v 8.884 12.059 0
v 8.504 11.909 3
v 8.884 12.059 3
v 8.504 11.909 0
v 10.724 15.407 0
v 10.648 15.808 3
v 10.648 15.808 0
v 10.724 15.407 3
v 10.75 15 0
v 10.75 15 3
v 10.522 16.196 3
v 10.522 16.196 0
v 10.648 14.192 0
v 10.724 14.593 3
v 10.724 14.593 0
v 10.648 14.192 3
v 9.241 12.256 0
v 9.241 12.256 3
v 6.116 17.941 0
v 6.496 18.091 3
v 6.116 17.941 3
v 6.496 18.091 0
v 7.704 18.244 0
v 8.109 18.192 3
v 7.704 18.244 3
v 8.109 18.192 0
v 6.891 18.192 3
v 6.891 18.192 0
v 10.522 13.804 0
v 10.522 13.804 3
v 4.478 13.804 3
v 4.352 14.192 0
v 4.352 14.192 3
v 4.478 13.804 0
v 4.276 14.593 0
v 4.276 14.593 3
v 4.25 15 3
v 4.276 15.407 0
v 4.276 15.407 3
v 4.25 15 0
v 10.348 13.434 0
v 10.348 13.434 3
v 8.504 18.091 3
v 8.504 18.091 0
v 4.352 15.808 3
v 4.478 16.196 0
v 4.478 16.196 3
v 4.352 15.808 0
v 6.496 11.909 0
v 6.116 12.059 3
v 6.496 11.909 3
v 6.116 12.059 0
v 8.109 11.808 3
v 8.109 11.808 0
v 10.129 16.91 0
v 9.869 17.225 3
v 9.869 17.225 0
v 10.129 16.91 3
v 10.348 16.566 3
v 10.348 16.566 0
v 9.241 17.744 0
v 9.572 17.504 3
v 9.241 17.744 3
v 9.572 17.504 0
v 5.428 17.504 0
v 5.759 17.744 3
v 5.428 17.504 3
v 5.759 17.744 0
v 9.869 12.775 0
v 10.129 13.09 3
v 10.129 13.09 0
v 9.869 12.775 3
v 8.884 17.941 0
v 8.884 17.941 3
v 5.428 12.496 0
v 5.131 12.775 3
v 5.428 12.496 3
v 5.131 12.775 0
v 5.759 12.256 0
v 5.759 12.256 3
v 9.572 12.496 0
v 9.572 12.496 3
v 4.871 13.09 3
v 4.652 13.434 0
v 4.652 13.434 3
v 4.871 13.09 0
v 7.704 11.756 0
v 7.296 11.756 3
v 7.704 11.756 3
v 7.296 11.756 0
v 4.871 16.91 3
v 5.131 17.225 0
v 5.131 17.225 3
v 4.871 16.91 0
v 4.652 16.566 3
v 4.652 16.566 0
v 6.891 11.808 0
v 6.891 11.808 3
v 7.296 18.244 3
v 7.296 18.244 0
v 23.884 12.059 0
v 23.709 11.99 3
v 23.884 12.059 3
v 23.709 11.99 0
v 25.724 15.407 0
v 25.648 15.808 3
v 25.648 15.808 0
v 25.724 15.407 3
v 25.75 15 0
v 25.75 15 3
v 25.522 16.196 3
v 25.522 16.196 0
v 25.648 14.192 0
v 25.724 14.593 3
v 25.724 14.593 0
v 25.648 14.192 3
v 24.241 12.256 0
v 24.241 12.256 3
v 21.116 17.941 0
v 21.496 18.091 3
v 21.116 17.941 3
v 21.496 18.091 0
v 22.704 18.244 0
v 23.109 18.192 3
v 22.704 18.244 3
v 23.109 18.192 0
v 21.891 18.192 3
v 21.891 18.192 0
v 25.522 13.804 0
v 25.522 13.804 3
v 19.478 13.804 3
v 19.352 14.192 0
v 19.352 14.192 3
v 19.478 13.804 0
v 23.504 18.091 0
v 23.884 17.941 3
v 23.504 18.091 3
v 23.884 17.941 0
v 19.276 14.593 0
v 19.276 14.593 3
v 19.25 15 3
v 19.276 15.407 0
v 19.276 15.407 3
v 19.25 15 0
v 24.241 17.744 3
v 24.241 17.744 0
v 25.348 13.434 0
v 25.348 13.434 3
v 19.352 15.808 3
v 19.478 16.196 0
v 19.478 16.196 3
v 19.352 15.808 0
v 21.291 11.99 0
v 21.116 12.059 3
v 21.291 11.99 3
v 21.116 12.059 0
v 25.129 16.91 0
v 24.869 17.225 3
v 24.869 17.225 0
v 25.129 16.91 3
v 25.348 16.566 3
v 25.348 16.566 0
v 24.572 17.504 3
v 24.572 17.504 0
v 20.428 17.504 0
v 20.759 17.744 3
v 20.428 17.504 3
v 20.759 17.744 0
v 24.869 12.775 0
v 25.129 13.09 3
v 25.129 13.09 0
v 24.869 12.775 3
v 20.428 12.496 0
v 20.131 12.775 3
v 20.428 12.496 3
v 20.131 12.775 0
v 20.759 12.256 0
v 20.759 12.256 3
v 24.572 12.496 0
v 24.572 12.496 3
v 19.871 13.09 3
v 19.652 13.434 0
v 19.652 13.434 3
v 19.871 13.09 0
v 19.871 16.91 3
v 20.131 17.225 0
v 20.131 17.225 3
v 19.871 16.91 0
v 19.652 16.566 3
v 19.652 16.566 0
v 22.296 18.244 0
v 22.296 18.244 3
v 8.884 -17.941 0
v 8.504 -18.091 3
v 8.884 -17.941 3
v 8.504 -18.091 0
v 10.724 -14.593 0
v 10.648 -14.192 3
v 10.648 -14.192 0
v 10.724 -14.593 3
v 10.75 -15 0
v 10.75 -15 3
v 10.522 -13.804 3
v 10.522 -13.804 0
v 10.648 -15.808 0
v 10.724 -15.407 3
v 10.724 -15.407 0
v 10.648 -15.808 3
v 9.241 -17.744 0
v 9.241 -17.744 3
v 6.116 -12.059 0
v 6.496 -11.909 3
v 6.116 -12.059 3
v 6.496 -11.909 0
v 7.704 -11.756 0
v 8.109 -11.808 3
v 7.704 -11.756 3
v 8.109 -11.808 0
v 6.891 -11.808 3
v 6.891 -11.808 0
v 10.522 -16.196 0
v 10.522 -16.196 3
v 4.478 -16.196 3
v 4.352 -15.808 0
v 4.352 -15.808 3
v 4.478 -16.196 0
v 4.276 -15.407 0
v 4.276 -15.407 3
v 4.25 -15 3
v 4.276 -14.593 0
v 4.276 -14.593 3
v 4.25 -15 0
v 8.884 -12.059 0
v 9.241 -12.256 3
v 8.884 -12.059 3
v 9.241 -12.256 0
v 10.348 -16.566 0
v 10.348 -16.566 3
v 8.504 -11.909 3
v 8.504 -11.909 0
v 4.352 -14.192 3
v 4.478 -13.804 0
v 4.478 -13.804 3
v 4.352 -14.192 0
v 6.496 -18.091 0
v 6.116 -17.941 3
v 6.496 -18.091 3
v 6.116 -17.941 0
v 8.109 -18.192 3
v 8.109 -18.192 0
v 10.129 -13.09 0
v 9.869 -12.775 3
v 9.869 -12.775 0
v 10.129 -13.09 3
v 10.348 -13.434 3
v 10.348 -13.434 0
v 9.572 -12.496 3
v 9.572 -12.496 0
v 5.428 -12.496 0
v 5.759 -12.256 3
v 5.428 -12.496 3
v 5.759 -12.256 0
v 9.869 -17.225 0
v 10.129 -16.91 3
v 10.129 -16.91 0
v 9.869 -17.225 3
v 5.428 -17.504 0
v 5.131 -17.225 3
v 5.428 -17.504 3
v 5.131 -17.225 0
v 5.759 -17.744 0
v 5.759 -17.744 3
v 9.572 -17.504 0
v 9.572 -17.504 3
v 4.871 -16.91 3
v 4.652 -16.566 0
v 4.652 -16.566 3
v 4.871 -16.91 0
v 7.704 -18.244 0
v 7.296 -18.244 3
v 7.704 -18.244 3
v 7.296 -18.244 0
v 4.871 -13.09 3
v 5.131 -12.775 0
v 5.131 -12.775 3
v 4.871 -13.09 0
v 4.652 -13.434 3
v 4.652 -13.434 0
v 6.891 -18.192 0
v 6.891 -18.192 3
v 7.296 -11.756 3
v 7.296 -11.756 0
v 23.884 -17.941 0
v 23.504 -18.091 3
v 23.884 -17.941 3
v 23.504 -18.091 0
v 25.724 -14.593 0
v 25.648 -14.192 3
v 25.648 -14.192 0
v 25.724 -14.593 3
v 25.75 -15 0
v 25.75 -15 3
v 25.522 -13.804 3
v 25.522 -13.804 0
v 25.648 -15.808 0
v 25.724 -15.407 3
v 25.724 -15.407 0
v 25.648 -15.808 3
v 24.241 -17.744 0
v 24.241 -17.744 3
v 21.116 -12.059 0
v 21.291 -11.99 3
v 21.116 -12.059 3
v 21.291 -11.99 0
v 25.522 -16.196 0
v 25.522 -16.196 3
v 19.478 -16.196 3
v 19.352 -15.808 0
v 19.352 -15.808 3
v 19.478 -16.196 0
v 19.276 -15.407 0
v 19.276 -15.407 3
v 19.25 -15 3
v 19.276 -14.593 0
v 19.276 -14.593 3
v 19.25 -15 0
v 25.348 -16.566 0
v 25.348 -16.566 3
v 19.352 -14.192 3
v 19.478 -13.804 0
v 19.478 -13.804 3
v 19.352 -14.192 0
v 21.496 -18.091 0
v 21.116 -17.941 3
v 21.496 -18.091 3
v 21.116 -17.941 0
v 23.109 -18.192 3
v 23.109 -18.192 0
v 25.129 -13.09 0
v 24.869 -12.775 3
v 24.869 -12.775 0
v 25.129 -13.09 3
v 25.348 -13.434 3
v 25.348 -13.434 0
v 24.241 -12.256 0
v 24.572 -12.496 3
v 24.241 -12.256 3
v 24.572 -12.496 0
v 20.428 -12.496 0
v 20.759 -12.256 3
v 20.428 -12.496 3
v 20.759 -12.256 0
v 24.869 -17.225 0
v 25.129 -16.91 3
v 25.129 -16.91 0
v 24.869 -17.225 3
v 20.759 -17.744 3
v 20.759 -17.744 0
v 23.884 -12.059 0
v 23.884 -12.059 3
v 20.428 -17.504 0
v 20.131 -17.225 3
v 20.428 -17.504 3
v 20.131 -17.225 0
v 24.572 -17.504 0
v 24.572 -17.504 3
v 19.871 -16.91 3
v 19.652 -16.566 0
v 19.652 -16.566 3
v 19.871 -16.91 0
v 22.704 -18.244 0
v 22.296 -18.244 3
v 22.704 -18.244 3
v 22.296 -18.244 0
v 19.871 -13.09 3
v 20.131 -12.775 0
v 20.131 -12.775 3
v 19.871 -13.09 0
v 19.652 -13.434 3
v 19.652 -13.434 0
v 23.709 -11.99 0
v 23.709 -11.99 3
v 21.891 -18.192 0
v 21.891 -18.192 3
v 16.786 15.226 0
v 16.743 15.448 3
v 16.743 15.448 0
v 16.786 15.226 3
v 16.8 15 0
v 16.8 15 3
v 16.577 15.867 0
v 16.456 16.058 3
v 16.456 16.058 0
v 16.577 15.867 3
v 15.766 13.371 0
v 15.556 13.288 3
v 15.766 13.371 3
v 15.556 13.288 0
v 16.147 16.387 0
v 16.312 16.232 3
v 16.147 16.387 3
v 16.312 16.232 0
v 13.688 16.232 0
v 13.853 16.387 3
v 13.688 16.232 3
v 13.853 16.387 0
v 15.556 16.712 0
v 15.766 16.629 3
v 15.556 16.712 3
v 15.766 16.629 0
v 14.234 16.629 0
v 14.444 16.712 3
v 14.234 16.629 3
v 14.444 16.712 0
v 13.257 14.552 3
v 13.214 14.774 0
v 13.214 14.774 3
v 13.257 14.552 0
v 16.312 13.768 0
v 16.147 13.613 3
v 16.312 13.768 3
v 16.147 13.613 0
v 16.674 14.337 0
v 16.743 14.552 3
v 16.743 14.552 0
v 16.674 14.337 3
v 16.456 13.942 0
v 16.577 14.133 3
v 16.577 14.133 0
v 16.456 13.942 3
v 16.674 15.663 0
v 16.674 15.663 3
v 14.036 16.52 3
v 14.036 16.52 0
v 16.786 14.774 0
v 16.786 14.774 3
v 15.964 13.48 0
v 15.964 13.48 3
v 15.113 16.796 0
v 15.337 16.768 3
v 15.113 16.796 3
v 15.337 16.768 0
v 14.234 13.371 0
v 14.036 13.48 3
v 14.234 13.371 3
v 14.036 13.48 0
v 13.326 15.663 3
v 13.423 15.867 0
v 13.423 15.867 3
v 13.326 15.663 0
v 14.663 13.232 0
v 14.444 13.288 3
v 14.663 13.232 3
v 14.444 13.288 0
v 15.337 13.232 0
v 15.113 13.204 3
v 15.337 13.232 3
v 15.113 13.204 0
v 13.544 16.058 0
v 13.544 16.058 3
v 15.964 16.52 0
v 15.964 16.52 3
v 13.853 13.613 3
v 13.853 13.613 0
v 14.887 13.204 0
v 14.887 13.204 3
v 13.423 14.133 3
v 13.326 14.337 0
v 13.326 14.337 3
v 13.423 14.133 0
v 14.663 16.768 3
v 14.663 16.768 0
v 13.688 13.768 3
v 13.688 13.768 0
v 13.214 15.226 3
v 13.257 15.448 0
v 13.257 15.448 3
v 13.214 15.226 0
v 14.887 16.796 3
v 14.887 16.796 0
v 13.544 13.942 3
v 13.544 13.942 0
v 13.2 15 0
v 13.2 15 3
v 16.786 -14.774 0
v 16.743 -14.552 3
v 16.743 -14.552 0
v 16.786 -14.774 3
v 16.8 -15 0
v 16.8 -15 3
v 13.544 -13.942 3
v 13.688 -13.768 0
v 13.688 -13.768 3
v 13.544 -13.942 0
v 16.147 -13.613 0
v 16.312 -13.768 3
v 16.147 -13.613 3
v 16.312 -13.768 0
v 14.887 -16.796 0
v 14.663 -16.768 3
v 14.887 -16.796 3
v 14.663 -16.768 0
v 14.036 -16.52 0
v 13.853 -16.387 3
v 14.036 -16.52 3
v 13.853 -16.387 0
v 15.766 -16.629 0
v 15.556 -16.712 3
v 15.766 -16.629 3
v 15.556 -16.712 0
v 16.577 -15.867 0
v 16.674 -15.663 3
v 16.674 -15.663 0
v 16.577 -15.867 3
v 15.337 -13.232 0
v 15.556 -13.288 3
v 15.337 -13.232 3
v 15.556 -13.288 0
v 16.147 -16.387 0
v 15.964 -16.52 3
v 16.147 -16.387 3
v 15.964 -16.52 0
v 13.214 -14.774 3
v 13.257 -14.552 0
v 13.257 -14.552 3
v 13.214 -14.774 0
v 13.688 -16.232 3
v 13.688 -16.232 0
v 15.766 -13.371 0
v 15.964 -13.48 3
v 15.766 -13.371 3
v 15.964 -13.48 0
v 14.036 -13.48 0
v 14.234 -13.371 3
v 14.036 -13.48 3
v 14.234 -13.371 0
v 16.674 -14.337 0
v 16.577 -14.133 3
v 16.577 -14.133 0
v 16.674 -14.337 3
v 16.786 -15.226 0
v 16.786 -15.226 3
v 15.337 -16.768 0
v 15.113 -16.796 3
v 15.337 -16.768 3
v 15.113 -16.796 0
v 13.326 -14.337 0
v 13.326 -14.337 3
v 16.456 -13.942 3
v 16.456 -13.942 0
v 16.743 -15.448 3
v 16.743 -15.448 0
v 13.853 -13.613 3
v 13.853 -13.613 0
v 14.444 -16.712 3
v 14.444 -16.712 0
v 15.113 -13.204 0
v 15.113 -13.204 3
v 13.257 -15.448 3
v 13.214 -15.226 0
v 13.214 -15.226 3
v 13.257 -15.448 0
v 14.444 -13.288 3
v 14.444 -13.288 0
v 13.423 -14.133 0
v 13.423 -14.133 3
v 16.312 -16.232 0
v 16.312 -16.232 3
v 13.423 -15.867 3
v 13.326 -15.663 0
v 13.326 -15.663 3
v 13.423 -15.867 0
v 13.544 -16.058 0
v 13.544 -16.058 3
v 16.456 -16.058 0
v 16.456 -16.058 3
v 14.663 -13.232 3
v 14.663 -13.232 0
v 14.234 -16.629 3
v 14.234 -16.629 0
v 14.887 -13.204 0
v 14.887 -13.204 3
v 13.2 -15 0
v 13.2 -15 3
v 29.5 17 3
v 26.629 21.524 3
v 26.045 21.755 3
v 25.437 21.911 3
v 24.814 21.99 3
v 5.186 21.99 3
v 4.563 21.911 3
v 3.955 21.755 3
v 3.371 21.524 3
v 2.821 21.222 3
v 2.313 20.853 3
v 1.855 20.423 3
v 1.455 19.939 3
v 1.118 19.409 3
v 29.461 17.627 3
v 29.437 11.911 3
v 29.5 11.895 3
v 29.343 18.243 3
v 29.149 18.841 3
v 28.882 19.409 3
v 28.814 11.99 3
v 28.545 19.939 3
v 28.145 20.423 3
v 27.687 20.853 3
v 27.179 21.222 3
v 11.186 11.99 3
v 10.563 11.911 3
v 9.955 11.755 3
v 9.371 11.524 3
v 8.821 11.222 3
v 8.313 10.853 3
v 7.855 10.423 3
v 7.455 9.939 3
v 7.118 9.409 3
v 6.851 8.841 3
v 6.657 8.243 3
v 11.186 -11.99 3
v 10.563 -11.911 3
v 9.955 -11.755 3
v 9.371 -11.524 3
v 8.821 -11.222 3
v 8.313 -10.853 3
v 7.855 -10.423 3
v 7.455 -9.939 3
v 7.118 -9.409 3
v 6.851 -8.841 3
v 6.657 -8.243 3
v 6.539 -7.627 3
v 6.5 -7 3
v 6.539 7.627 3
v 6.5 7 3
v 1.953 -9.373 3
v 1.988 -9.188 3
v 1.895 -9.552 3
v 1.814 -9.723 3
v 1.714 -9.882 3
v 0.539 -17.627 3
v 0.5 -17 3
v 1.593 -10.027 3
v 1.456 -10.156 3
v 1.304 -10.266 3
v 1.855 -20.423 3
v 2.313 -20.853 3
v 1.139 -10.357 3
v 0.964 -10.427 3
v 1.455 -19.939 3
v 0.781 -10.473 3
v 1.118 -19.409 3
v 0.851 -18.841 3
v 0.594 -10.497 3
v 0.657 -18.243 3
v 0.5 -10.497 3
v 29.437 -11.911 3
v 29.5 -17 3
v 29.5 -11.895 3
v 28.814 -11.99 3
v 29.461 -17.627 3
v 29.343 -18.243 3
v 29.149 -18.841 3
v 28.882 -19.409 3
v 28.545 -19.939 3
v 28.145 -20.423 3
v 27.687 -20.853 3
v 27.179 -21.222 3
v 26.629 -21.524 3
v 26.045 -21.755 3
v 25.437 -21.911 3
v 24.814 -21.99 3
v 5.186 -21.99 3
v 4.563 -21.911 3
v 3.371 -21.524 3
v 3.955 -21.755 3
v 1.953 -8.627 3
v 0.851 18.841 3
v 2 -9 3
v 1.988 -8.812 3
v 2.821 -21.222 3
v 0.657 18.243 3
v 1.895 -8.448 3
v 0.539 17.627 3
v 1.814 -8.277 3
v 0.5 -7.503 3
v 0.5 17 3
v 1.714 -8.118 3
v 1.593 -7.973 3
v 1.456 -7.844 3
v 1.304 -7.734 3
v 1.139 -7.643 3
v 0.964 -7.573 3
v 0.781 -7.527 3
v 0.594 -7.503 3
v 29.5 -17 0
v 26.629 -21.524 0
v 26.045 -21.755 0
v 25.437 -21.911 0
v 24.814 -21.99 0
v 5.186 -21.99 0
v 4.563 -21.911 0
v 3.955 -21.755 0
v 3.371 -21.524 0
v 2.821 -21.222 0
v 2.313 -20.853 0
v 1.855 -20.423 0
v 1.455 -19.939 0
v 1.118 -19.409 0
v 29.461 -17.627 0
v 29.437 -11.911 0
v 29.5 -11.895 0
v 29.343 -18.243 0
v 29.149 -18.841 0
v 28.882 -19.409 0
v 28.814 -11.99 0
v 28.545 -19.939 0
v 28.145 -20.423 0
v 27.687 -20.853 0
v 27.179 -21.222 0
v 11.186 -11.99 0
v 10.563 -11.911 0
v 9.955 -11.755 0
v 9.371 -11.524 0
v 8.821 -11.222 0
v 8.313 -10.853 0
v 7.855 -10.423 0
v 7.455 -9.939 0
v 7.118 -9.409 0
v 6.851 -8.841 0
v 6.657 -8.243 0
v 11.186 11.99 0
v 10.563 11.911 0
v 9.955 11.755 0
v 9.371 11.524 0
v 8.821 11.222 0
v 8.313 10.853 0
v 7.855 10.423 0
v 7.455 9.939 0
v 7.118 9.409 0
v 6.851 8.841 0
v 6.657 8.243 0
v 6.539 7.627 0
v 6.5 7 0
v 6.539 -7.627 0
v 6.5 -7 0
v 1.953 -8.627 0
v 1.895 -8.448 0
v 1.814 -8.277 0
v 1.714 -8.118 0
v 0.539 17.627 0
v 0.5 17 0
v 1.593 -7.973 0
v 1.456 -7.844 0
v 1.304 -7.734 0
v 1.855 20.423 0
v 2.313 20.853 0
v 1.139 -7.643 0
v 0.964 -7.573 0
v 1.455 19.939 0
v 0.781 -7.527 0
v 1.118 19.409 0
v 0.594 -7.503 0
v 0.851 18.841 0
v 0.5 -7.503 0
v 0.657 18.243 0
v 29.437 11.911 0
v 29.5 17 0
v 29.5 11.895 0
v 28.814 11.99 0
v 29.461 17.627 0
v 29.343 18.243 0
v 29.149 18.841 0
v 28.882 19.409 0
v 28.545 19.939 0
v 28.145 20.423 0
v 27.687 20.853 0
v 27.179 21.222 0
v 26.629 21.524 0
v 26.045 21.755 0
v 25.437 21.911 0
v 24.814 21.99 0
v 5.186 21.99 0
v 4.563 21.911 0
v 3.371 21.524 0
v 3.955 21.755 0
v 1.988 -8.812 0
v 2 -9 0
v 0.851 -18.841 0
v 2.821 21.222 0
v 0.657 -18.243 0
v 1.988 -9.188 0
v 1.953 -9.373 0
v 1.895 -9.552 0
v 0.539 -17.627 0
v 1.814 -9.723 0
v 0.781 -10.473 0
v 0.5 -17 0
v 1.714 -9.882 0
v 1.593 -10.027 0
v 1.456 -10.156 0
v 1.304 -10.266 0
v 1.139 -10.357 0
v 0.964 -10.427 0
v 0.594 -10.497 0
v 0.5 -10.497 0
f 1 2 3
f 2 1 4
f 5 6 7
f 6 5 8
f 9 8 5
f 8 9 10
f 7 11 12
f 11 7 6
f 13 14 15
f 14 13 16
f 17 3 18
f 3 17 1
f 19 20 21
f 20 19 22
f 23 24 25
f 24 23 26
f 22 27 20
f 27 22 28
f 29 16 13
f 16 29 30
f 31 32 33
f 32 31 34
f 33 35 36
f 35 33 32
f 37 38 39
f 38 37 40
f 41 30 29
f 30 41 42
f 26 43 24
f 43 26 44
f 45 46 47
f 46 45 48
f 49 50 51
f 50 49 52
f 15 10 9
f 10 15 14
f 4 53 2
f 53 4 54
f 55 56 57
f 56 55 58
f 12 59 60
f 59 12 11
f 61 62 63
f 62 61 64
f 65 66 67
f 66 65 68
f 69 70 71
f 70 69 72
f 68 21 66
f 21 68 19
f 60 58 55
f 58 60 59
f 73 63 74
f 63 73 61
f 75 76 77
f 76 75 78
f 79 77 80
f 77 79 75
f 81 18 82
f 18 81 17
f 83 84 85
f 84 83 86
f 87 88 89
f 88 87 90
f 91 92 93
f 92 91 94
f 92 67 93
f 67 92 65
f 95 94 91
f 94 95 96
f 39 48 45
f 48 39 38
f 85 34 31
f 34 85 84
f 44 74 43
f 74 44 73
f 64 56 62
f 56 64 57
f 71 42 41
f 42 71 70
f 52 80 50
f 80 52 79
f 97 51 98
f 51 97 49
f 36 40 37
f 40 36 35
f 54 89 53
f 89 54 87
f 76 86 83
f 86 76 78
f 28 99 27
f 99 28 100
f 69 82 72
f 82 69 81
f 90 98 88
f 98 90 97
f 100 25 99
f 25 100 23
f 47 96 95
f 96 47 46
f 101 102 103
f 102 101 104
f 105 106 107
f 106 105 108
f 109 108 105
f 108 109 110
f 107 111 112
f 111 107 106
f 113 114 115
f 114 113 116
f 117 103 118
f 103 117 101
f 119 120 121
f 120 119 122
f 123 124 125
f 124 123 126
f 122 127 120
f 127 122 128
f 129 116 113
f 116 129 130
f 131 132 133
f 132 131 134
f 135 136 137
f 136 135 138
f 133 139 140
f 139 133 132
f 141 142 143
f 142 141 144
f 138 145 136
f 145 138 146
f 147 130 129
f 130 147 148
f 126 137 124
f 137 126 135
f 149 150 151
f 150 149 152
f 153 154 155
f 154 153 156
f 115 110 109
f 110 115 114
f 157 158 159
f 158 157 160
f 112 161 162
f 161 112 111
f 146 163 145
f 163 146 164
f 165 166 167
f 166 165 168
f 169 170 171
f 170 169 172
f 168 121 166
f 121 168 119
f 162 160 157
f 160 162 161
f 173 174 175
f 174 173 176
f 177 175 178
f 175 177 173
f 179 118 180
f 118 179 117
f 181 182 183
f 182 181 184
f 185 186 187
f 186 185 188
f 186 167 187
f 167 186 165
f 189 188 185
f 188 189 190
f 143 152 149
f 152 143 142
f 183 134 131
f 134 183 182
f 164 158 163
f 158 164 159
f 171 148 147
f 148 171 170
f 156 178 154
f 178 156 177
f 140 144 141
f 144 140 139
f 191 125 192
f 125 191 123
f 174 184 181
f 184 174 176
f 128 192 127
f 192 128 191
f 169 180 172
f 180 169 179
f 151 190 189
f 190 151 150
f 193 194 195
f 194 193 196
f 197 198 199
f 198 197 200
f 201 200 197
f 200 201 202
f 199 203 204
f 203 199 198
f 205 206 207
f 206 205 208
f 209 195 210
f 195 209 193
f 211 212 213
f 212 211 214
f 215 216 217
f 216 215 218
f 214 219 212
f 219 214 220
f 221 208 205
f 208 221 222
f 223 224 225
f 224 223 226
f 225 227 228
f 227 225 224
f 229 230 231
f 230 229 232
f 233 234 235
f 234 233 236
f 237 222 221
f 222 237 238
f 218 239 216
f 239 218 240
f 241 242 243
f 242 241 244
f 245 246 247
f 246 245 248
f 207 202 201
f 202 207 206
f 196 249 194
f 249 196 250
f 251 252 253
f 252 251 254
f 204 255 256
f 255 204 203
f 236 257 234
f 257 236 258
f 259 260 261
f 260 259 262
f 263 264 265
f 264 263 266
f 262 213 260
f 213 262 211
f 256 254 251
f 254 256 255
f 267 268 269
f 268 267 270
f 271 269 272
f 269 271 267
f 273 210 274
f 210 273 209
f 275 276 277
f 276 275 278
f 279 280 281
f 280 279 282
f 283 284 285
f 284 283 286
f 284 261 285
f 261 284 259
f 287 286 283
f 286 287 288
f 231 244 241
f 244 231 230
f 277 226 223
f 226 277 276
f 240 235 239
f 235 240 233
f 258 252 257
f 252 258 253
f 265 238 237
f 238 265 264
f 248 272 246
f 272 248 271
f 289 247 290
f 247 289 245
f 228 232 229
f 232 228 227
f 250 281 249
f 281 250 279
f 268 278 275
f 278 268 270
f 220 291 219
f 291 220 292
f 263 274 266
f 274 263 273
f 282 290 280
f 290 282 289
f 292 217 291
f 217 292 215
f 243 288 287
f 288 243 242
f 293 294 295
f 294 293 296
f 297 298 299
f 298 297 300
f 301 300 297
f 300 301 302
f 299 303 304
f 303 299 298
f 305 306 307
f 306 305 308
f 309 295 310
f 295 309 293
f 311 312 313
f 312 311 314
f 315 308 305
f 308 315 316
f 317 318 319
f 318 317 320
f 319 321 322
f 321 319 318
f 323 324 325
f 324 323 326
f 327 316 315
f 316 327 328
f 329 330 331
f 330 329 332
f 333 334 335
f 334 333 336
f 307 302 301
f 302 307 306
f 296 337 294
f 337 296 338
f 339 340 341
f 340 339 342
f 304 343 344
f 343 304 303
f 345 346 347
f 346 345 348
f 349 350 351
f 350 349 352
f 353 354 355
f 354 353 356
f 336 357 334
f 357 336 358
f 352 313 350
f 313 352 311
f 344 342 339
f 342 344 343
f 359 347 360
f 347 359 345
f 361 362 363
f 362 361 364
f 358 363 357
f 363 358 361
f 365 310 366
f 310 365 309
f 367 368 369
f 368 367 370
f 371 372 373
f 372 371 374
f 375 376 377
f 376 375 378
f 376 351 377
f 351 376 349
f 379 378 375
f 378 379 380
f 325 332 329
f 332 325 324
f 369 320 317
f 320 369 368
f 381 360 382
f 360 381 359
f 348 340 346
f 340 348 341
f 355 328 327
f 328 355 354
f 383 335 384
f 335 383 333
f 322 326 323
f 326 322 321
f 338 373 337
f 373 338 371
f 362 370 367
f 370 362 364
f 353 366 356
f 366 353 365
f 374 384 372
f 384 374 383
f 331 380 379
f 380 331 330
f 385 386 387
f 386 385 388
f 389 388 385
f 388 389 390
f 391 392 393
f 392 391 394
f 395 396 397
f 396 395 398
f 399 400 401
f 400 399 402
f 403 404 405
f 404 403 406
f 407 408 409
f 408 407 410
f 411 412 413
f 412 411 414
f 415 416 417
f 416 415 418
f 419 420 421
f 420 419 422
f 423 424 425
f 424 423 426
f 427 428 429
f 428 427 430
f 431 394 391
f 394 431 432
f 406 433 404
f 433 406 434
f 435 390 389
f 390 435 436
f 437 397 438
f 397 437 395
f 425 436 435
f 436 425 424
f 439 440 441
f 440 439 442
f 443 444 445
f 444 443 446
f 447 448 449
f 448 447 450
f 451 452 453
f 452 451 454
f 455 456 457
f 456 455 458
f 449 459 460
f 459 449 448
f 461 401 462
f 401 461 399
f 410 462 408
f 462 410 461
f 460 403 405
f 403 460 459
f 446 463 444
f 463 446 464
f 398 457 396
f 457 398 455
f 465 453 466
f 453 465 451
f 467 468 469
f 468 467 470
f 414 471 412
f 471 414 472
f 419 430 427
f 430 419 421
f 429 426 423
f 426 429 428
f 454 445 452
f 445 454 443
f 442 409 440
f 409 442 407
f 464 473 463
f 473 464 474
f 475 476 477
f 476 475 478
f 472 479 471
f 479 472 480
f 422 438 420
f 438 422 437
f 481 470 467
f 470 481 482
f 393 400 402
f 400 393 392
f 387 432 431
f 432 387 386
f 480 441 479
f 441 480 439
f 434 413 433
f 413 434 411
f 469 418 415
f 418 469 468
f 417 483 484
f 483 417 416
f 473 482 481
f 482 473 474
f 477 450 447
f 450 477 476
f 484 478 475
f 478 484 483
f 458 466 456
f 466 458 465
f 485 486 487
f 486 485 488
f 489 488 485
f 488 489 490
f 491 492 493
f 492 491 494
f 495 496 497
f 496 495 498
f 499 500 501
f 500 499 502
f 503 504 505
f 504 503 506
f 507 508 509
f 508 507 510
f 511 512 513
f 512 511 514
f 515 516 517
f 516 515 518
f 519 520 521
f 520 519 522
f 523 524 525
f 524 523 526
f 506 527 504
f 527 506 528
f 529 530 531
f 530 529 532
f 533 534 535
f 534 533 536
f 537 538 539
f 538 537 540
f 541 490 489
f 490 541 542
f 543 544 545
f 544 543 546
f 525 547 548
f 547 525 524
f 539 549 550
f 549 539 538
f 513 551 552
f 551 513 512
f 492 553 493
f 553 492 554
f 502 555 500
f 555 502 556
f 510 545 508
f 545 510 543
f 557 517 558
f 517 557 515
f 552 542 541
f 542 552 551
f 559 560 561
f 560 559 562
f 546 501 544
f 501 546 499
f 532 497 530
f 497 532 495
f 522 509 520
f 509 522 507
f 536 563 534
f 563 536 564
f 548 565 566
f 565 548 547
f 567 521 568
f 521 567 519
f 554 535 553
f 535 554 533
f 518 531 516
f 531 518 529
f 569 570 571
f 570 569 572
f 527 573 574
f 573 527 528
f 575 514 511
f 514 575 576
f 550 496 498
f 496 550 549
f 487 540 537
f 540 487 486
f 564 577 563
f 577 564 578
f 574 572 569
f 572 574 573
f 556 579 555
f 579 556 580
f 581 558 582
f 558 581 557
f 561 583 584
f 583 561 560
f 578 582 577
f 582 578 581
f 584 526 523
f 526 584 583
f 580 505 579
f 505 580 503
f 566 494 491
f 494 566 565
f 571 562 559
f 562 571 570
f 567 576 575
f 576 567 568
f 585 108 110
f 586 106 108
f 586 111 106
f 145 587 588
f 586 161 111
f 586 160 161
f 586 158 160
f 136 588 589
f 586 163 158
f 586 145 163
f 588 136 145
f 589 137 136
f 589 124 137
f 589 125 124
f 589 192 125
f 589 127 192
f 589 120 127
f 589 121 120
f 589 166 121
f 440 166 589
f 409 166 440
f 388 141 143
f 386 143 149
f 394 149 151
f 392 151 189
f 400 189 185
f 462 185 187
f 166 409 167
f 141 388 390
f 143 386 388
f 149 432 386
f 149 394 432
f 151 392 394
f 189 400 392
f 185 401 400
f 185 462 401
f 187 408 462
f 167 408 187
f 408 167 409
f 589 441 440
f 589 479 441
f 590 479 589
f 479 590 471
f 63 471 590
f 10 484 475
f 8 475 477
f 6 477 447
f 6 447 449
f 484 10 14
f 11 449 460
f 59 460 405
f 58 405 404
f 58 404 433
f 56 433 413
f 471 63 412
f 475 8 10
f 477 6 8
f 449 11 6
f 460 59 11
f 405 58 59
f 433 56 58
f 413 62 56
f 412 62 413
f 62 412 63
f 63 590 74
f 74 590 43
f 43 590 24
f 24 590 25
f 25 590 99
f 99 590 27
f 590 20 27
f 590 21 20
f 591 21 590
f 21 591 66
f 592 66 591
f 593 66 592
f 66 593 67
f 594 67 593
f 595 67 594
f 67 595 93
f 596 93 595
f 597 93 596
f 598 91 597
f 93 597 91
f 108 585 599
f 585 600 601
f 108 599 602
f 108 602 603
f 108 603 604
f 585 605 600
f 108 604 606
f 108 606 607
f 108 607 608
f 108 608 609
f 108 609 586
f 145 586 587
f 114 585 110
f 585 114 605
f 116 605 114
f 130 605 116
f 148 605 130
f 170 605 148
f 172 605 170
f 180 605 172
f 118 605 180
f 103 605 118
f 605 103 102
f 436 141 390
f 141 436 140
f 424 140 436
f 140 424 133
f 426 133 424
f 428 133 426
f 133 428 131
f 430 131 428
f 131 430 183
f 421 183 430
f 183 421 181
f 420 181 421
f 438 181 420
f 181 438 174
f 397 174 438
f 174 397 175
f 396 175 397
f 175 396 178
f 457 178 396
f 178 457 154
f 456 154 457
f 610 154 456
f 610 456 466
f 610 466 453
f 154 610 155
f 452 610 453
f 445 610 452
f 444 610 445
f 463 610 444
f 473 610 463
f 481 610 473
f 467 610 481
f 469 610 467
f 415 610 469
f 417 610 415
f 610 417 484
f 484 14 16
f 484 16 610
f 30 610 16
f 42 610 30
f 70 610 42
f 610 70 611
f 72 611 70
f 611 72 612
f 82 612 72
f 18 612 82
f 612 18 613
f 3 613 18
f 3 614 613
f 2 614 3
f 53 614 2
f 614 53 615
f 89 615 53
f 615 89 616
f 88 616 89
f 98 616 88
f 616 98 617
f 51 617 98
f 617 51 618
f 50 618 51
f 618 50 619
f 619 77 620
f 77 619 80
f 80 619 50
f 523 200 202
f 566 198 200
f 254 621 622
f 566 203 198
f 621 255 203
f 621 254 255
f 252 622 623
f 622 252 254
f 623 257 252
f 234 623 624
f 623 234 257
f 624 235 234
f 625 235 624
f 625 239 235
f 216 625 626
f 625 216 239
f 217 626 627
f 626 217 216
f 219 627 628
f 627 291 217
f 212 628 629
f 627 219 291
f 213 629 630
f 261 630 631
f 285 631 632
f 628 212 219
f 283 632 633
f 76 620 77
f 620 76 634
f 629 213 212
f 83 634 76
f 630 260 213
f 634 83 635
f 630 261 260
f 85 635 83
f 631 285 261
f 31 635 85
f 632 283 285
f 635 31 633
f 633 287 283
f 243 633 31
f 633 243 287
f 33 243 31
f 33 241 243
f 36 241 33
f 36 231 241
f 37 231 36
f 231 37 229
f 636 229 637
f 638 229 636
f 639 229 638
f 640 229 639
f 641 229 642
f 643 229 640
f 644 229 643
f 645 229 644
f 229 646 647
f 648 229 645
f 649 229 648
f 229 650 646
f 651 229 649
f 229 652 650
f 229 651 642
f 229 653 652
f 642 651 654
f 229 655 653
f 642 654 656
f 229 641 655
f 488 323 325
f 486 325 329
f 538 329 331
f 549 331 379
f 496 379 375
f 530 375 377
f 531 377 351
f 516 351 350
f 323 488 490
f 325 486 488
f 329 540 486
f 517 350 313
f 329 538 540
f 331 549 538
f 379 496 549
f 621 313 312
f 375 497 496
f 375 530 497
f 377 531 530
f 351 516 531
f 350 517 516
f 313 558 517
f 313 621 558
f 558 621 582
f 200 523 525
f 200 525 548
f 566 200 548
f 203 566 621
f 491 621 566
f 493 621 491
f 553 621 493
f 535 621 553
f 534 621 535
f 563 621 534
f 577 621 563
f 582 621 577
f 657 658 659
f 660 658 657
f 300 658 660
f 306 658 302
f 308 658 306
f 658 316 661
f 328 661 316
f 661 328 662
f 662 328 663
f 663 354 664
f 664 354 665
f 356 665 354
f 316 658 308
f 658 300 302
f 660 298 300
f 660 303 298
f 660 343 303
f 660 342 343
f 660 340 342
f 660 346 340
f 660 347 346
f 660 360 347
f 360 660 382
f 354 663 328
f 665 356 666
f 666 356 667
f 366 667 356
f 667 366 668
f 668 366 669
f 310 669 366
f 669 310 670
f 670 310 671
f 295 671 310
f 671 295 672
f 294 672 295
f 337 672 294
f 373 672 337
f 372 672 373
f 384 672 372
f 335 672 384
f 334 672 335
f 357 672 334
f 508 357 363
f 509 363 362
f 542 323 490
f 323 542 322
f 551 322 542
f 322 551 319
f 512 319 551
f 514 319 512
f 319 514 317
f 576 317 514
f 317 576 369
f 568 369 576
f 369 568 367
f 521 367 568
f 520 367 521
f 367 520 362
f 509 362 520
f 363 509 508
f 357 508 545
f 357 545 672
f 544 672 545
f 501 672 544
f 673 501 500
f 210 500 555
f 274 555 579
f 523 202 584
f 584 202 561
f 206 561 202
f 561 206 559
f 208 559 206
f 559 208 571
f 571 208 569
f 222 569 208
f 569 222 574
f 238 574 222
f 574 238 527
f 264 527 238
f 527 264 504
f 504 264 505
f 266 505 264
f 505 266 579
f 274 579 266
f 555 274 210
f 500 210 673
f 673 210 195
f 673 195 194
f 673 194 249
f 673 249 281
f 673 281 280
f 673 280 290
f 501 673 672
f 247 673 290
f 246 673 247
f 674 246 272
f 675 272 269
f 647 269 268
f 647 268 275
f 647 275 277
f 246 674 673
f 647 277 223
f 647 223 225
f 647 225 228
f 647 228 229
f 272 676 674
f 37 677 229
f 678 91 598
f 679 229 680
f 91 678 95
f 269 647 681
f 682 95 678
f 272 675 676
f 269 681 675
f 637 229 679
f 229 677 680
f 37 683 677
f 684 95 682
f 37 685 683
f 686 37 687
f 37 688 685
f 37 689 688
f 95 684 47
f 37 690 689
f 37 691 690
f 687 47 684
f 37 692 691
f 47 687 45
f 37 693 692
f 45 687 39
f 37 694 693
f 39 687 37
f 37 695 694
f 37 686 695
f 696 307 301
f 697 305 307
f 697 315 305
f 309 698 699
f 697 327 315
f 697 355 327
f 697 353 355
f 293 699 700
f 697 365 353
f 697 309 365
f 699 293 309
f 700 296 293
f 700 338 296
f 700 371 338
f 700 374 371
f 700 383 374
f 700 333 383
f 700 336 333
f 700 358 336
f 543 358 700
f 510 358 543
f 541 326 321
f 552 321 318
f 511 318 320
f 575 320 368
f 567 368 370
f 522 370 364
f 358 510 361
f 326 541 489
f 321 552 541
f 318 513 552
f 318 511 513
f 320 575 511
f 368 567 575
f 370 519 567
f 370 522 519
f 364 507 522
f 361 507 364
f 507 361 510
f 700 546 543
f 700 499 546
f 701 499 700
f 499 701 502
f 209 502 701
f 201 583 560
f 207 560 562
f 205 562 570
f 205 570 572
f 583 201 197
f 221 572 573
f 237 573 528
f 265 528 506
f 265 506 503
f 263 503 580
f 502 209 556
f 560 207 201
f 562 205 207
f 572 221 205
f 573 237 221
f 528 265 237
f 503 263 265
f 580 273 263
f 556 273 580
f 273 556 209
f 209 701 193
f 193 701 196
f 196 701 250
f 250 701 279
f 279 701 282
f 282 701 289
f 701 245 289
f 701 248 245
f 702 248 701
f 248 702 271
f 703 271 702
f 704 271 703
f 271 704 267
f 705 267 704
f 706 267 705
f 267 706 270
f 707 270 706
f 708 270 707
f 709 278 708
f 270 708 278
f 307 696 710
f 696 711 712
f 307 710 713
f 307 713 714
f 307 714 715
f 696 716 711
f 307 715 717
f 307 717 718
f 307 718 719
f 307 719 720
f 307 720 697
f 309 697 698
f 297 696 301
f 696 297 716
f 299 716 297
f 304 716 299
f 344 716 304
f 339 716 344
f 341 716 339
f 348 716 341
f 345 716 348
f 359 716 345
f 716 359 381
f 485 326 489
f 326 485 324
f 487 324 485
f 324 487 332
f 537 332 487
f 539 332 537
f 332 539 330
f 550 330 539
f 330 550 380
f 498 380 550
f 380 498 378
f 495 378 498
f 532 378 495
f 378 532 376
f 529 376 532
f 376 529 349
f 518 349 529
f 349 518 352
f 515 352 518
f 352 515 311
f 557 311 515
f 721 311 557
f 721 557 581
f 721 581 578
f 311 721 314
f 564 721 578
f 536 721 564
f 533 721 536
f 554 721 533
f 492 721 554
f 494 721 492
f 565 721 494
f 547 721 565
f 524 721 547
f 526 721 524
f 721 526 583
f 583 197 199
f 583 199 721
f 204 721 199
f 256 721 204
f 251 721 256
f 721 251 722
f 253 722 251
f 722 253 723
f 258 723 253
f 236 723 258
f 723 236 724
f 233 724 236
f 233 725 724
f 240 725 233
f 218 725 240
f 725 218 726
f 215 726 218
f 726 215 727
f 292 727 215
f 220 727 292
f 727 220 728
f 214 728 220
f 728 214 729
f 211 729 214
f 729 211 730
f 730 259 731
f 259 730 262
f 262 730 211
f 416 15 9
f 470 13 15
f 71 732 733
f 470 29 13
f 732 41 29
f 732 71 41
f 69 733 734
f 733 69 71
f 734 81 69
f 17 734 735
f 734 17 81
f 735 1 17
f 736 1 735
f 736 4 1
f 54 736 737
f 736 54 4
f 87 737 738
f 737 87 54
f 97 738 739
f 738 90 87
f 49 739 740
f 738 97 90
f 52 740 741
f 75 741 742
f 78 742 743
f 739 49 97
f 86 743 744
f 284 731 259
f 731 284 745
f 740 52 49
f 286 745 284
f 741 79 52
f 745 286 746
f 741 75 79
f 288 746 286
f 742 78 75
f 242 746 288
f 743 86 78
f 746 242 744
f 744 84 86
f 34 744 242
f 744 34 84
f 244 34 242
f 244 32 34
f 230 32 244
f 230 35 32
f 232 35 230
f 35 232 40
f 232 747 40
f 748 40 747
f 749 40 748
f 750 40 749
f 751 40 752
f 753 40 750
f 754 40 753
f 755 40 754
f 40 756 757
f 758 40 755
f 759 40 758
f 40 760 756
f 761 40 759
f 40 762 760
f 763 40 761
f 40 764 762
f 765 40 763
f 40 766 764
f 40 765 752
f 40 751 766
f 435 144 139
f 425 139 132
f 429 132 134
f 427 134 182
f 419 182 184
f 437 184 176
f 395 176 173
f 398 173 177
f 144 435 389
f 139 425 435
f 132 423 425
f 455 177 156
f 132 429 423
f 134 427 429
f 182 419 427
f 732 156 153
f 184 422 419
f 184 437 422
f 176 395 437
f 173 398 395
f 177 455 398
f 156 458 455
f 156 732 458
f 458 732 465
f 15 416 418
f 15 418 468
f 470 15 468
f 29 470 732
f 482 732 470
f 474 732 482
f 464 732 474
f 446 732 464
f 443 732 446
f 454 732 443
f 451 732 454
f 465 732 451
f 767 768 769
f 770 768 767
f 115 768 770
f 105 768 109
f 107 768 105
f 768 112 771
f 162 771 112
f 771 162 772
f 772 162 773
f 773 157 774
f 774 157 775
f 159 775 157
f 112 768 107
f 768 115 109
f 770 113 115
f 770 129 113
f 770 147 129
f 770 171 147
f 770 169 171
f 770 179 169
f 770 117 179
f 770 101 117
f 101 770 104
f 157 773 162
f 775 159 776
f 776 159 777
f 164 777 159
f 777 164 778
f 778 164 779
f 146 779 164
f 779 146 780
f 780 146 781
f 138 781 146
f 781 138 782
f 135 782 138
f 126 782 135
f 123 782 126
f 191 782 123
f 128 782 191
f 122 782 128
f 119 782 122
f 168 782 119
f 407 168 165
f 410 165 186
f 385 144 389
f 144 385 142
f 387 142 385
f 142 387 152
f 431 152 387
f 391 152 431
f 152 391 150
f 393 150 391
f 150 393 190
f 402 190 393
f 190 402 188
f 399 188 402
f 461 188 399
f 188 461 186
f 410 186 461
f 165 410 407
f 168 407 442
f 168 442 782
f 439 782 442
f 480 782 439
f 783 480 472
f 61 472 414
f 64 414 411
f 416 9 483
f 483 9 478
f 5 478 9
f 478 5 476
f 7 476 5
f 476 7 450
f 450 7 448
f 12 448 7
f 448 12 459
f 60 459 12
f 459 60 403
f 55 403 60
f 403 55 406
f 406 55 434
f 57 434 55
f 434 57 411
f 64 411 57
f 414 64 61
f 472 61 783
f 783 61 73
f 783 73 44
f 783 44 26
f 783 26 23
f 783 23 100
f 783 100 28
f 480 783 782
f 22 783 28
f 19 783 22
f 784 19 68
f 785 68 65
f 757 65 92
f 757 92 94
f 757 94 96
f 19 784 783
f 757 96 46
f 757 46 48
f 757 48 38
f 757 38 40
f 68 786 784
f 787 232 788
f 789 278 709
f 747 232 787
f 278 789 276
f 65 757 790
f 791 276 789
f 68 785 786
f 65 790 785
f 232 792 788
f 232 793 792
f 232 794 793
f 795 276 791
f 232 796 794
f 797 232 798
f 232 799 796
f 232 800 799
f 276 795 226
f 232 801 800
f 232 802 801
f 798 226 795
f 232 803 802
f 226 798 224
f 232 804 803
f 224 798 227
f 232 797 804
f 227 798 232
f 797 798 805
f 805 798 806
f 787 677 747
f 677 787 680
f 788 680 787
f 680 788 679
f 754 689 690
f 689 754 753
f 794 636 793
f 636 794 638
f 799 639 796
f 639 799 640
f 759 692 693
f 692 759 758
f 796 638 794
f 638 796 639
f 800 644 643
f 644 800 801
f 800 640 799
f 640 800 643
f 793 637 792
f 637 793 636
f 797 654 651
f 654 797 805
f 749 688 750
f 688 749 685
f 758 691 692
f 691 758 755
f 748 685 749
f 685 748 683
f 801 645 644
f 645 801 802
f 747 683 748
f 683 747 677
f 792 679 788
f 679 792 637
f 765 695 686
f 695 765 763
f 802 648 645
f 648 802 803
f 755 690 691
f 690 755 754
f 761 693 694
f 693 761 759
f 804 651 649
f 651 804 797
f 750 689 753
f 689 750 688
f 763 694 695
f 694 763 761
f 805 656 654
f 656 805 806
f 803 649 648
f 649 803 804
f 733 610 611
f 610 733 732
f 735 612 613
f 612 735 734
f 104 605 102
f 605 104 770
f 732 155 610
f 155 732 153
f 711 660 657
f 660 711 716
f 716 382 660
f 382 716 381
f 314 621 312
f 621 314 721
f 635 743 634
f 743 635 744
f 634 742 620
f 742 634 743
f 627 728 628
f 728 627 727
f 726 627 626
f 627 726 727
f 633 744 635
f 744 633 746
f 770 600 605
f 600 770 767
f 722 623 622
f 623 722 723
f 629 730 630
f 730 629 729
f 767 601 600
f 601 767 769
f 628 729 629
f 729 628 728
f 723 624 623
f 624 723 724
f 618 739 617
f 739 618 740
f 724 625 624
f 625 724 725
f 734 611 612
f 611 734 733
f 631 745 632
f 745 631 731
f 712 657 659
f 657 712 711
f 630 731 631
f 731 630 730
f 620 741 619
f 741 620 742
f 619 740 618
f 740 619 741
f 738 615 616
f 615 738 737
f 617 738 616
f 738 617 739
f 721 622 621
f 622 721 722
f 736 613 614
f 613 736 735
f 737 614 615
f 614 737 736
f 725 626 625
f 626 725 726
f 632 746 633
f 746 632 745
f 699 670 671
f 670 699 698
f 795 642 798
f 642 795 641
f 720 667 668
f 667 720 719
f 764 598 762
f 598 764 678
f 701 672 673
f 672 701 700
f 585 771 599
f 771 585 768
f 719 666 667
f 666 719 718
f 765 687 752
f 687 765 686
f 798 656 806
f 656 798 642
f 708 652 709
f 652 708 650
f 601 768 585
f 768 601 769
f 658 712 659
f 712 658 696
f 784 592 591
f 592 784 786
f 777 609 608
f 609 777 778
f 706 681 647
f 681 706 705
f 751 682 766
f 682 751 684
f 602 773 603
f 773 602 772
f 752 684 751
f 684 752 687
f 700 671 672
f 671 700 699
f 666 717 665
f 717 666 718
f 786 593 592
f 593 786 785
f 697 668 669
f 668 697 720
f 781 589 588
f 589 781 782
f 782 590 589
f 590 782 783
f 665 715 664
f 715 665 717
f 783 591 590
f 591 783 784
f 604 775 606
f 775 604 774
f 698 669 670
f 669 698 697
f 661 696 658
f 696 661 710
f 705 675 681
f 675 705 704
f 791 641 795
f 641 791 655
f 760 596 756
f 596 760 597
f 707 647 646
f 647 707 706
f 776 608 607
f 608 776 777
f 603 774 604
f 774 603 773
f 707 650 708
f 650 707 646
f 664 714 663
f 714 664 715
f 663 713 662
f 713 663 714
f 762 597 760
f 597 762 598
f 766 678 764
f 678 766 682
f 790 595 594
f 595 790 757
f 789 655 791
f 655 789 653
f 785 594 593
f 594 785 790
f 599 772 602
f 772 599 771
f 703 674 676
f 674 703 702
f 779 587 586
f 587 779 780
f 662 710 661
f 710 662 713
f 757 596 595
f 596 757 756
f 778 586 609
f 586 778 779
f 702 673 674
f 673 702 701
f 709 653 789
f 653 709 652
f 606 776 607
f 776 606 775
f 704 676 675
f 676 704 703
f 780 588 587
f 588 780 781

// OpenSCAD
$fn = 50;


difference() {
	union() {
		translate(v = [15.0000000000, 0, 0]) {
			rotate(a = [0, 0, 0]) {
				hull() {
					translate(v = [-9.5000000000, 17.0000000000, 0]) {
						rotate(a = [0, 0, 0]) {
							translate(v = [0, 0, 0]) {
								rotate(a = [0, 0, 0]) {
									cylinder(h = 3, r = 5);
								}
							}
						}
					}
					translate(v = [9.5000000000, 17.0000000000, 0]) {
						rotate(a = [0, 0, 0]) {
							translate(v = [0, 0, 0]) {
								rotate(a = [0, 0, 0]) {
									cylinder(h = 3, r = 5);
								}
							}
						}
					}
					translate(v = [-9.5000000000, -17.0000000000, 0]) {
						rotate(a = [0, 0, 0]) {
							translate(v = [0, 0, 0]) {
								rotate(a = [0, 0, 0]) {
									cylinder(h = 3, r = 5);
								}
							}
						}
					}
					translate(v = [9.5000000000, -17.0000000000, 0]) {
						rotate(a = [0, 0, 0]) {
							translate(v = [0, 0, 0]) {
								rotate(a = [0, 0, 0]) {
									cylinder(h = 3, r = 5);
								}
							}
						}
					}
				}
			}
		}
	}
	union() {
		translate(v = [7.5000000000, 15.0000000000, -125.0000000000]) {
			rotate(a = [0, 0, 0]) {
				cylinder(h = 250, r = 3.2500000000);
			}
		}
		translate(v = [22.5000000000, 15.0000000000, -125.0000000000]) {
			rotate(a = [0, 0, 0]) {
				cylinder(h = 250, r = 3.2500000000);
			}
		}
		translate(v = [7.5000000000, -15.0000000000, -125.0000000000]) {
			rotate(a = [0, 0, 0]) {
				cylinder(h = 250, r = 3.2500000000);
			}
		}
		translate(v = [22.5000000000, -15.0000000000, -125.0000000000]) {
			rotate(a = [0, 0, 0]) {
				cylinder(h = 250, r = 3.2500000000);
			}
		}
		translate(v = [7.5000000000, 15.0000000000, -125.0000000000]) {
			rotate(a = [0, 0, 0]) {
				cylinder(h = 250, r = 1.8000000000);
			}
		}
		translate(v = [15.0000000000, 15.0000000000, -125.0000000000]) {
			rotate(a = [0, 0, 0]) {
				cylinder(h = 250, r = 1.8000000000);
			}
		}
		translate(v = [22.5000000000, 15.0000000000, -125.0000000000]) {
			rotate(a = [0, 0, 0]) {
				cylinder(h = 250, r = 1.8000000000);
			}
		}
		translate(v = [7.5000000000, -15.0000000000, -125.0000000000]) {
			rotate(a = [0, 0, 0]) {
				cylinder(h = 250, r = 1.8000000000);
			}
		}
		translate(v = [15.0000000000, -15.0000000000, -125.0000000000]) {
			rotate(a = [0, 0, 0]) {
				cylinder(h = 250, r = 1.8000000000);
			}
		}
		translate(v = [22.5000000000, -15.0000000000, -125.0000000000]) {
			rotate(a = [0, 0, 0]) {
				cylinder(h = 250, r = 1.8000000000);
			}
		}
		translate(v = [15, 7.5000000000, -125.0000000000]) {
			rotate(a = [0, 0, 0]) {
				cylinder(h = 250, r = 1.8000000000);
			}
		}
		translate(v = [15, -7.5000000000, -125.0000000000]) {
			rotate(a = [0, 0, 0]) {
				cylinder(h = 250, r = 1.8000000000);
			}
		}
		translate(v = [15, 7.5000000000, 3]) {
			rotate(a = [0, 0, 0]) {
				translate(v = [0, 0, 0]) {
					rotate(a = [0, 0, 0]) {
						linear_extrude(height = 3) {
							polygon(points = [[3.4620000000, 0.0000000000], [1.7310000000, 2.9981799479], [-1.7310000000, 2.9981799479], [-3.4620000000, 0.0000000000], [-1.7310000000, -2.9981799479], [1.7310000000, -2.9981799479]]);
						}
					}
				}
			}
		}
		translate(v = [15, -7.5000000000, 3]) {
			rotate(a = [0, 0, 0]) {
				translate(v = [0, 0, 0]) {
					rotate(a = [0, 0, 0]) {
						linear_extrude(height = 3) {
							polygon(points = [[3.4620000000, 0.0000000000], [1.7310000000, 2.9981799479], [-1.7310000000, 2.9981799479], [-3.4620000000, 0.0000000000], [-1.7310000000, -2.9981799479], [1.7310000000, -2.9981799479]]);
						}
					}
				}
			}
		}
		translate(v = [25.0890000000, -4.5000000000, 0]) {
			rotate(a = [0, 0, 0]) {
				cube(size = [3, 9, 10]);
			}
		}
		translate(v = [0.5000000000, -9, 0.0000000000]) {
			rotate(a = [0, 0, 0]) {
				cylinder(h = 3, r = 1.5000000000);
			}
		}
		translate(v = [20, 0, 0]) {
			rotate(a = [0, 0, 0]) {
				hull() {
					translate(v = [-8.5000000000, 7.0000000000, 0]) {
						rotate(a = [0, 0, 0]) {
							translate(v = [0, 0, 0]) {
								rotate(a = [0, 0, 0]) {
									cylinder(h = 3, r = 5);
								}
							}
						}
					}
					translate(v = [8.5000000000, 7.0000000000, 0]) {
						rotate(a = [0, 0, 0]) {
							translate(v = [0, 0, 0]) {
								rotate(a = [0, 0, 0]) {
									cylinder(h = 3, r = 5);
								}
							}
						}
					}
					translate(v = [-8.5000000000, -7.0000000000, 0]) {
						rotate(a = [0, 0, 0]) {
							translate(v = [0, 0, 0]) {
								rotate(a = [0, 0, 0]) {
									cylinder(h = 3, r = 5);
								}
							}
						}
					}
					translate(v = [8.5000000000, -7.0000000000, 0]) {
						rotate(a = [0, 0, 0]) {
							translate(v = [0, 0, 0]) {
								rotate(a = [0, 0, 0]) {
									cylinder(h = 3, r = 5);
								}
							}
						}
					}
				}
			}
		}
	}
}
